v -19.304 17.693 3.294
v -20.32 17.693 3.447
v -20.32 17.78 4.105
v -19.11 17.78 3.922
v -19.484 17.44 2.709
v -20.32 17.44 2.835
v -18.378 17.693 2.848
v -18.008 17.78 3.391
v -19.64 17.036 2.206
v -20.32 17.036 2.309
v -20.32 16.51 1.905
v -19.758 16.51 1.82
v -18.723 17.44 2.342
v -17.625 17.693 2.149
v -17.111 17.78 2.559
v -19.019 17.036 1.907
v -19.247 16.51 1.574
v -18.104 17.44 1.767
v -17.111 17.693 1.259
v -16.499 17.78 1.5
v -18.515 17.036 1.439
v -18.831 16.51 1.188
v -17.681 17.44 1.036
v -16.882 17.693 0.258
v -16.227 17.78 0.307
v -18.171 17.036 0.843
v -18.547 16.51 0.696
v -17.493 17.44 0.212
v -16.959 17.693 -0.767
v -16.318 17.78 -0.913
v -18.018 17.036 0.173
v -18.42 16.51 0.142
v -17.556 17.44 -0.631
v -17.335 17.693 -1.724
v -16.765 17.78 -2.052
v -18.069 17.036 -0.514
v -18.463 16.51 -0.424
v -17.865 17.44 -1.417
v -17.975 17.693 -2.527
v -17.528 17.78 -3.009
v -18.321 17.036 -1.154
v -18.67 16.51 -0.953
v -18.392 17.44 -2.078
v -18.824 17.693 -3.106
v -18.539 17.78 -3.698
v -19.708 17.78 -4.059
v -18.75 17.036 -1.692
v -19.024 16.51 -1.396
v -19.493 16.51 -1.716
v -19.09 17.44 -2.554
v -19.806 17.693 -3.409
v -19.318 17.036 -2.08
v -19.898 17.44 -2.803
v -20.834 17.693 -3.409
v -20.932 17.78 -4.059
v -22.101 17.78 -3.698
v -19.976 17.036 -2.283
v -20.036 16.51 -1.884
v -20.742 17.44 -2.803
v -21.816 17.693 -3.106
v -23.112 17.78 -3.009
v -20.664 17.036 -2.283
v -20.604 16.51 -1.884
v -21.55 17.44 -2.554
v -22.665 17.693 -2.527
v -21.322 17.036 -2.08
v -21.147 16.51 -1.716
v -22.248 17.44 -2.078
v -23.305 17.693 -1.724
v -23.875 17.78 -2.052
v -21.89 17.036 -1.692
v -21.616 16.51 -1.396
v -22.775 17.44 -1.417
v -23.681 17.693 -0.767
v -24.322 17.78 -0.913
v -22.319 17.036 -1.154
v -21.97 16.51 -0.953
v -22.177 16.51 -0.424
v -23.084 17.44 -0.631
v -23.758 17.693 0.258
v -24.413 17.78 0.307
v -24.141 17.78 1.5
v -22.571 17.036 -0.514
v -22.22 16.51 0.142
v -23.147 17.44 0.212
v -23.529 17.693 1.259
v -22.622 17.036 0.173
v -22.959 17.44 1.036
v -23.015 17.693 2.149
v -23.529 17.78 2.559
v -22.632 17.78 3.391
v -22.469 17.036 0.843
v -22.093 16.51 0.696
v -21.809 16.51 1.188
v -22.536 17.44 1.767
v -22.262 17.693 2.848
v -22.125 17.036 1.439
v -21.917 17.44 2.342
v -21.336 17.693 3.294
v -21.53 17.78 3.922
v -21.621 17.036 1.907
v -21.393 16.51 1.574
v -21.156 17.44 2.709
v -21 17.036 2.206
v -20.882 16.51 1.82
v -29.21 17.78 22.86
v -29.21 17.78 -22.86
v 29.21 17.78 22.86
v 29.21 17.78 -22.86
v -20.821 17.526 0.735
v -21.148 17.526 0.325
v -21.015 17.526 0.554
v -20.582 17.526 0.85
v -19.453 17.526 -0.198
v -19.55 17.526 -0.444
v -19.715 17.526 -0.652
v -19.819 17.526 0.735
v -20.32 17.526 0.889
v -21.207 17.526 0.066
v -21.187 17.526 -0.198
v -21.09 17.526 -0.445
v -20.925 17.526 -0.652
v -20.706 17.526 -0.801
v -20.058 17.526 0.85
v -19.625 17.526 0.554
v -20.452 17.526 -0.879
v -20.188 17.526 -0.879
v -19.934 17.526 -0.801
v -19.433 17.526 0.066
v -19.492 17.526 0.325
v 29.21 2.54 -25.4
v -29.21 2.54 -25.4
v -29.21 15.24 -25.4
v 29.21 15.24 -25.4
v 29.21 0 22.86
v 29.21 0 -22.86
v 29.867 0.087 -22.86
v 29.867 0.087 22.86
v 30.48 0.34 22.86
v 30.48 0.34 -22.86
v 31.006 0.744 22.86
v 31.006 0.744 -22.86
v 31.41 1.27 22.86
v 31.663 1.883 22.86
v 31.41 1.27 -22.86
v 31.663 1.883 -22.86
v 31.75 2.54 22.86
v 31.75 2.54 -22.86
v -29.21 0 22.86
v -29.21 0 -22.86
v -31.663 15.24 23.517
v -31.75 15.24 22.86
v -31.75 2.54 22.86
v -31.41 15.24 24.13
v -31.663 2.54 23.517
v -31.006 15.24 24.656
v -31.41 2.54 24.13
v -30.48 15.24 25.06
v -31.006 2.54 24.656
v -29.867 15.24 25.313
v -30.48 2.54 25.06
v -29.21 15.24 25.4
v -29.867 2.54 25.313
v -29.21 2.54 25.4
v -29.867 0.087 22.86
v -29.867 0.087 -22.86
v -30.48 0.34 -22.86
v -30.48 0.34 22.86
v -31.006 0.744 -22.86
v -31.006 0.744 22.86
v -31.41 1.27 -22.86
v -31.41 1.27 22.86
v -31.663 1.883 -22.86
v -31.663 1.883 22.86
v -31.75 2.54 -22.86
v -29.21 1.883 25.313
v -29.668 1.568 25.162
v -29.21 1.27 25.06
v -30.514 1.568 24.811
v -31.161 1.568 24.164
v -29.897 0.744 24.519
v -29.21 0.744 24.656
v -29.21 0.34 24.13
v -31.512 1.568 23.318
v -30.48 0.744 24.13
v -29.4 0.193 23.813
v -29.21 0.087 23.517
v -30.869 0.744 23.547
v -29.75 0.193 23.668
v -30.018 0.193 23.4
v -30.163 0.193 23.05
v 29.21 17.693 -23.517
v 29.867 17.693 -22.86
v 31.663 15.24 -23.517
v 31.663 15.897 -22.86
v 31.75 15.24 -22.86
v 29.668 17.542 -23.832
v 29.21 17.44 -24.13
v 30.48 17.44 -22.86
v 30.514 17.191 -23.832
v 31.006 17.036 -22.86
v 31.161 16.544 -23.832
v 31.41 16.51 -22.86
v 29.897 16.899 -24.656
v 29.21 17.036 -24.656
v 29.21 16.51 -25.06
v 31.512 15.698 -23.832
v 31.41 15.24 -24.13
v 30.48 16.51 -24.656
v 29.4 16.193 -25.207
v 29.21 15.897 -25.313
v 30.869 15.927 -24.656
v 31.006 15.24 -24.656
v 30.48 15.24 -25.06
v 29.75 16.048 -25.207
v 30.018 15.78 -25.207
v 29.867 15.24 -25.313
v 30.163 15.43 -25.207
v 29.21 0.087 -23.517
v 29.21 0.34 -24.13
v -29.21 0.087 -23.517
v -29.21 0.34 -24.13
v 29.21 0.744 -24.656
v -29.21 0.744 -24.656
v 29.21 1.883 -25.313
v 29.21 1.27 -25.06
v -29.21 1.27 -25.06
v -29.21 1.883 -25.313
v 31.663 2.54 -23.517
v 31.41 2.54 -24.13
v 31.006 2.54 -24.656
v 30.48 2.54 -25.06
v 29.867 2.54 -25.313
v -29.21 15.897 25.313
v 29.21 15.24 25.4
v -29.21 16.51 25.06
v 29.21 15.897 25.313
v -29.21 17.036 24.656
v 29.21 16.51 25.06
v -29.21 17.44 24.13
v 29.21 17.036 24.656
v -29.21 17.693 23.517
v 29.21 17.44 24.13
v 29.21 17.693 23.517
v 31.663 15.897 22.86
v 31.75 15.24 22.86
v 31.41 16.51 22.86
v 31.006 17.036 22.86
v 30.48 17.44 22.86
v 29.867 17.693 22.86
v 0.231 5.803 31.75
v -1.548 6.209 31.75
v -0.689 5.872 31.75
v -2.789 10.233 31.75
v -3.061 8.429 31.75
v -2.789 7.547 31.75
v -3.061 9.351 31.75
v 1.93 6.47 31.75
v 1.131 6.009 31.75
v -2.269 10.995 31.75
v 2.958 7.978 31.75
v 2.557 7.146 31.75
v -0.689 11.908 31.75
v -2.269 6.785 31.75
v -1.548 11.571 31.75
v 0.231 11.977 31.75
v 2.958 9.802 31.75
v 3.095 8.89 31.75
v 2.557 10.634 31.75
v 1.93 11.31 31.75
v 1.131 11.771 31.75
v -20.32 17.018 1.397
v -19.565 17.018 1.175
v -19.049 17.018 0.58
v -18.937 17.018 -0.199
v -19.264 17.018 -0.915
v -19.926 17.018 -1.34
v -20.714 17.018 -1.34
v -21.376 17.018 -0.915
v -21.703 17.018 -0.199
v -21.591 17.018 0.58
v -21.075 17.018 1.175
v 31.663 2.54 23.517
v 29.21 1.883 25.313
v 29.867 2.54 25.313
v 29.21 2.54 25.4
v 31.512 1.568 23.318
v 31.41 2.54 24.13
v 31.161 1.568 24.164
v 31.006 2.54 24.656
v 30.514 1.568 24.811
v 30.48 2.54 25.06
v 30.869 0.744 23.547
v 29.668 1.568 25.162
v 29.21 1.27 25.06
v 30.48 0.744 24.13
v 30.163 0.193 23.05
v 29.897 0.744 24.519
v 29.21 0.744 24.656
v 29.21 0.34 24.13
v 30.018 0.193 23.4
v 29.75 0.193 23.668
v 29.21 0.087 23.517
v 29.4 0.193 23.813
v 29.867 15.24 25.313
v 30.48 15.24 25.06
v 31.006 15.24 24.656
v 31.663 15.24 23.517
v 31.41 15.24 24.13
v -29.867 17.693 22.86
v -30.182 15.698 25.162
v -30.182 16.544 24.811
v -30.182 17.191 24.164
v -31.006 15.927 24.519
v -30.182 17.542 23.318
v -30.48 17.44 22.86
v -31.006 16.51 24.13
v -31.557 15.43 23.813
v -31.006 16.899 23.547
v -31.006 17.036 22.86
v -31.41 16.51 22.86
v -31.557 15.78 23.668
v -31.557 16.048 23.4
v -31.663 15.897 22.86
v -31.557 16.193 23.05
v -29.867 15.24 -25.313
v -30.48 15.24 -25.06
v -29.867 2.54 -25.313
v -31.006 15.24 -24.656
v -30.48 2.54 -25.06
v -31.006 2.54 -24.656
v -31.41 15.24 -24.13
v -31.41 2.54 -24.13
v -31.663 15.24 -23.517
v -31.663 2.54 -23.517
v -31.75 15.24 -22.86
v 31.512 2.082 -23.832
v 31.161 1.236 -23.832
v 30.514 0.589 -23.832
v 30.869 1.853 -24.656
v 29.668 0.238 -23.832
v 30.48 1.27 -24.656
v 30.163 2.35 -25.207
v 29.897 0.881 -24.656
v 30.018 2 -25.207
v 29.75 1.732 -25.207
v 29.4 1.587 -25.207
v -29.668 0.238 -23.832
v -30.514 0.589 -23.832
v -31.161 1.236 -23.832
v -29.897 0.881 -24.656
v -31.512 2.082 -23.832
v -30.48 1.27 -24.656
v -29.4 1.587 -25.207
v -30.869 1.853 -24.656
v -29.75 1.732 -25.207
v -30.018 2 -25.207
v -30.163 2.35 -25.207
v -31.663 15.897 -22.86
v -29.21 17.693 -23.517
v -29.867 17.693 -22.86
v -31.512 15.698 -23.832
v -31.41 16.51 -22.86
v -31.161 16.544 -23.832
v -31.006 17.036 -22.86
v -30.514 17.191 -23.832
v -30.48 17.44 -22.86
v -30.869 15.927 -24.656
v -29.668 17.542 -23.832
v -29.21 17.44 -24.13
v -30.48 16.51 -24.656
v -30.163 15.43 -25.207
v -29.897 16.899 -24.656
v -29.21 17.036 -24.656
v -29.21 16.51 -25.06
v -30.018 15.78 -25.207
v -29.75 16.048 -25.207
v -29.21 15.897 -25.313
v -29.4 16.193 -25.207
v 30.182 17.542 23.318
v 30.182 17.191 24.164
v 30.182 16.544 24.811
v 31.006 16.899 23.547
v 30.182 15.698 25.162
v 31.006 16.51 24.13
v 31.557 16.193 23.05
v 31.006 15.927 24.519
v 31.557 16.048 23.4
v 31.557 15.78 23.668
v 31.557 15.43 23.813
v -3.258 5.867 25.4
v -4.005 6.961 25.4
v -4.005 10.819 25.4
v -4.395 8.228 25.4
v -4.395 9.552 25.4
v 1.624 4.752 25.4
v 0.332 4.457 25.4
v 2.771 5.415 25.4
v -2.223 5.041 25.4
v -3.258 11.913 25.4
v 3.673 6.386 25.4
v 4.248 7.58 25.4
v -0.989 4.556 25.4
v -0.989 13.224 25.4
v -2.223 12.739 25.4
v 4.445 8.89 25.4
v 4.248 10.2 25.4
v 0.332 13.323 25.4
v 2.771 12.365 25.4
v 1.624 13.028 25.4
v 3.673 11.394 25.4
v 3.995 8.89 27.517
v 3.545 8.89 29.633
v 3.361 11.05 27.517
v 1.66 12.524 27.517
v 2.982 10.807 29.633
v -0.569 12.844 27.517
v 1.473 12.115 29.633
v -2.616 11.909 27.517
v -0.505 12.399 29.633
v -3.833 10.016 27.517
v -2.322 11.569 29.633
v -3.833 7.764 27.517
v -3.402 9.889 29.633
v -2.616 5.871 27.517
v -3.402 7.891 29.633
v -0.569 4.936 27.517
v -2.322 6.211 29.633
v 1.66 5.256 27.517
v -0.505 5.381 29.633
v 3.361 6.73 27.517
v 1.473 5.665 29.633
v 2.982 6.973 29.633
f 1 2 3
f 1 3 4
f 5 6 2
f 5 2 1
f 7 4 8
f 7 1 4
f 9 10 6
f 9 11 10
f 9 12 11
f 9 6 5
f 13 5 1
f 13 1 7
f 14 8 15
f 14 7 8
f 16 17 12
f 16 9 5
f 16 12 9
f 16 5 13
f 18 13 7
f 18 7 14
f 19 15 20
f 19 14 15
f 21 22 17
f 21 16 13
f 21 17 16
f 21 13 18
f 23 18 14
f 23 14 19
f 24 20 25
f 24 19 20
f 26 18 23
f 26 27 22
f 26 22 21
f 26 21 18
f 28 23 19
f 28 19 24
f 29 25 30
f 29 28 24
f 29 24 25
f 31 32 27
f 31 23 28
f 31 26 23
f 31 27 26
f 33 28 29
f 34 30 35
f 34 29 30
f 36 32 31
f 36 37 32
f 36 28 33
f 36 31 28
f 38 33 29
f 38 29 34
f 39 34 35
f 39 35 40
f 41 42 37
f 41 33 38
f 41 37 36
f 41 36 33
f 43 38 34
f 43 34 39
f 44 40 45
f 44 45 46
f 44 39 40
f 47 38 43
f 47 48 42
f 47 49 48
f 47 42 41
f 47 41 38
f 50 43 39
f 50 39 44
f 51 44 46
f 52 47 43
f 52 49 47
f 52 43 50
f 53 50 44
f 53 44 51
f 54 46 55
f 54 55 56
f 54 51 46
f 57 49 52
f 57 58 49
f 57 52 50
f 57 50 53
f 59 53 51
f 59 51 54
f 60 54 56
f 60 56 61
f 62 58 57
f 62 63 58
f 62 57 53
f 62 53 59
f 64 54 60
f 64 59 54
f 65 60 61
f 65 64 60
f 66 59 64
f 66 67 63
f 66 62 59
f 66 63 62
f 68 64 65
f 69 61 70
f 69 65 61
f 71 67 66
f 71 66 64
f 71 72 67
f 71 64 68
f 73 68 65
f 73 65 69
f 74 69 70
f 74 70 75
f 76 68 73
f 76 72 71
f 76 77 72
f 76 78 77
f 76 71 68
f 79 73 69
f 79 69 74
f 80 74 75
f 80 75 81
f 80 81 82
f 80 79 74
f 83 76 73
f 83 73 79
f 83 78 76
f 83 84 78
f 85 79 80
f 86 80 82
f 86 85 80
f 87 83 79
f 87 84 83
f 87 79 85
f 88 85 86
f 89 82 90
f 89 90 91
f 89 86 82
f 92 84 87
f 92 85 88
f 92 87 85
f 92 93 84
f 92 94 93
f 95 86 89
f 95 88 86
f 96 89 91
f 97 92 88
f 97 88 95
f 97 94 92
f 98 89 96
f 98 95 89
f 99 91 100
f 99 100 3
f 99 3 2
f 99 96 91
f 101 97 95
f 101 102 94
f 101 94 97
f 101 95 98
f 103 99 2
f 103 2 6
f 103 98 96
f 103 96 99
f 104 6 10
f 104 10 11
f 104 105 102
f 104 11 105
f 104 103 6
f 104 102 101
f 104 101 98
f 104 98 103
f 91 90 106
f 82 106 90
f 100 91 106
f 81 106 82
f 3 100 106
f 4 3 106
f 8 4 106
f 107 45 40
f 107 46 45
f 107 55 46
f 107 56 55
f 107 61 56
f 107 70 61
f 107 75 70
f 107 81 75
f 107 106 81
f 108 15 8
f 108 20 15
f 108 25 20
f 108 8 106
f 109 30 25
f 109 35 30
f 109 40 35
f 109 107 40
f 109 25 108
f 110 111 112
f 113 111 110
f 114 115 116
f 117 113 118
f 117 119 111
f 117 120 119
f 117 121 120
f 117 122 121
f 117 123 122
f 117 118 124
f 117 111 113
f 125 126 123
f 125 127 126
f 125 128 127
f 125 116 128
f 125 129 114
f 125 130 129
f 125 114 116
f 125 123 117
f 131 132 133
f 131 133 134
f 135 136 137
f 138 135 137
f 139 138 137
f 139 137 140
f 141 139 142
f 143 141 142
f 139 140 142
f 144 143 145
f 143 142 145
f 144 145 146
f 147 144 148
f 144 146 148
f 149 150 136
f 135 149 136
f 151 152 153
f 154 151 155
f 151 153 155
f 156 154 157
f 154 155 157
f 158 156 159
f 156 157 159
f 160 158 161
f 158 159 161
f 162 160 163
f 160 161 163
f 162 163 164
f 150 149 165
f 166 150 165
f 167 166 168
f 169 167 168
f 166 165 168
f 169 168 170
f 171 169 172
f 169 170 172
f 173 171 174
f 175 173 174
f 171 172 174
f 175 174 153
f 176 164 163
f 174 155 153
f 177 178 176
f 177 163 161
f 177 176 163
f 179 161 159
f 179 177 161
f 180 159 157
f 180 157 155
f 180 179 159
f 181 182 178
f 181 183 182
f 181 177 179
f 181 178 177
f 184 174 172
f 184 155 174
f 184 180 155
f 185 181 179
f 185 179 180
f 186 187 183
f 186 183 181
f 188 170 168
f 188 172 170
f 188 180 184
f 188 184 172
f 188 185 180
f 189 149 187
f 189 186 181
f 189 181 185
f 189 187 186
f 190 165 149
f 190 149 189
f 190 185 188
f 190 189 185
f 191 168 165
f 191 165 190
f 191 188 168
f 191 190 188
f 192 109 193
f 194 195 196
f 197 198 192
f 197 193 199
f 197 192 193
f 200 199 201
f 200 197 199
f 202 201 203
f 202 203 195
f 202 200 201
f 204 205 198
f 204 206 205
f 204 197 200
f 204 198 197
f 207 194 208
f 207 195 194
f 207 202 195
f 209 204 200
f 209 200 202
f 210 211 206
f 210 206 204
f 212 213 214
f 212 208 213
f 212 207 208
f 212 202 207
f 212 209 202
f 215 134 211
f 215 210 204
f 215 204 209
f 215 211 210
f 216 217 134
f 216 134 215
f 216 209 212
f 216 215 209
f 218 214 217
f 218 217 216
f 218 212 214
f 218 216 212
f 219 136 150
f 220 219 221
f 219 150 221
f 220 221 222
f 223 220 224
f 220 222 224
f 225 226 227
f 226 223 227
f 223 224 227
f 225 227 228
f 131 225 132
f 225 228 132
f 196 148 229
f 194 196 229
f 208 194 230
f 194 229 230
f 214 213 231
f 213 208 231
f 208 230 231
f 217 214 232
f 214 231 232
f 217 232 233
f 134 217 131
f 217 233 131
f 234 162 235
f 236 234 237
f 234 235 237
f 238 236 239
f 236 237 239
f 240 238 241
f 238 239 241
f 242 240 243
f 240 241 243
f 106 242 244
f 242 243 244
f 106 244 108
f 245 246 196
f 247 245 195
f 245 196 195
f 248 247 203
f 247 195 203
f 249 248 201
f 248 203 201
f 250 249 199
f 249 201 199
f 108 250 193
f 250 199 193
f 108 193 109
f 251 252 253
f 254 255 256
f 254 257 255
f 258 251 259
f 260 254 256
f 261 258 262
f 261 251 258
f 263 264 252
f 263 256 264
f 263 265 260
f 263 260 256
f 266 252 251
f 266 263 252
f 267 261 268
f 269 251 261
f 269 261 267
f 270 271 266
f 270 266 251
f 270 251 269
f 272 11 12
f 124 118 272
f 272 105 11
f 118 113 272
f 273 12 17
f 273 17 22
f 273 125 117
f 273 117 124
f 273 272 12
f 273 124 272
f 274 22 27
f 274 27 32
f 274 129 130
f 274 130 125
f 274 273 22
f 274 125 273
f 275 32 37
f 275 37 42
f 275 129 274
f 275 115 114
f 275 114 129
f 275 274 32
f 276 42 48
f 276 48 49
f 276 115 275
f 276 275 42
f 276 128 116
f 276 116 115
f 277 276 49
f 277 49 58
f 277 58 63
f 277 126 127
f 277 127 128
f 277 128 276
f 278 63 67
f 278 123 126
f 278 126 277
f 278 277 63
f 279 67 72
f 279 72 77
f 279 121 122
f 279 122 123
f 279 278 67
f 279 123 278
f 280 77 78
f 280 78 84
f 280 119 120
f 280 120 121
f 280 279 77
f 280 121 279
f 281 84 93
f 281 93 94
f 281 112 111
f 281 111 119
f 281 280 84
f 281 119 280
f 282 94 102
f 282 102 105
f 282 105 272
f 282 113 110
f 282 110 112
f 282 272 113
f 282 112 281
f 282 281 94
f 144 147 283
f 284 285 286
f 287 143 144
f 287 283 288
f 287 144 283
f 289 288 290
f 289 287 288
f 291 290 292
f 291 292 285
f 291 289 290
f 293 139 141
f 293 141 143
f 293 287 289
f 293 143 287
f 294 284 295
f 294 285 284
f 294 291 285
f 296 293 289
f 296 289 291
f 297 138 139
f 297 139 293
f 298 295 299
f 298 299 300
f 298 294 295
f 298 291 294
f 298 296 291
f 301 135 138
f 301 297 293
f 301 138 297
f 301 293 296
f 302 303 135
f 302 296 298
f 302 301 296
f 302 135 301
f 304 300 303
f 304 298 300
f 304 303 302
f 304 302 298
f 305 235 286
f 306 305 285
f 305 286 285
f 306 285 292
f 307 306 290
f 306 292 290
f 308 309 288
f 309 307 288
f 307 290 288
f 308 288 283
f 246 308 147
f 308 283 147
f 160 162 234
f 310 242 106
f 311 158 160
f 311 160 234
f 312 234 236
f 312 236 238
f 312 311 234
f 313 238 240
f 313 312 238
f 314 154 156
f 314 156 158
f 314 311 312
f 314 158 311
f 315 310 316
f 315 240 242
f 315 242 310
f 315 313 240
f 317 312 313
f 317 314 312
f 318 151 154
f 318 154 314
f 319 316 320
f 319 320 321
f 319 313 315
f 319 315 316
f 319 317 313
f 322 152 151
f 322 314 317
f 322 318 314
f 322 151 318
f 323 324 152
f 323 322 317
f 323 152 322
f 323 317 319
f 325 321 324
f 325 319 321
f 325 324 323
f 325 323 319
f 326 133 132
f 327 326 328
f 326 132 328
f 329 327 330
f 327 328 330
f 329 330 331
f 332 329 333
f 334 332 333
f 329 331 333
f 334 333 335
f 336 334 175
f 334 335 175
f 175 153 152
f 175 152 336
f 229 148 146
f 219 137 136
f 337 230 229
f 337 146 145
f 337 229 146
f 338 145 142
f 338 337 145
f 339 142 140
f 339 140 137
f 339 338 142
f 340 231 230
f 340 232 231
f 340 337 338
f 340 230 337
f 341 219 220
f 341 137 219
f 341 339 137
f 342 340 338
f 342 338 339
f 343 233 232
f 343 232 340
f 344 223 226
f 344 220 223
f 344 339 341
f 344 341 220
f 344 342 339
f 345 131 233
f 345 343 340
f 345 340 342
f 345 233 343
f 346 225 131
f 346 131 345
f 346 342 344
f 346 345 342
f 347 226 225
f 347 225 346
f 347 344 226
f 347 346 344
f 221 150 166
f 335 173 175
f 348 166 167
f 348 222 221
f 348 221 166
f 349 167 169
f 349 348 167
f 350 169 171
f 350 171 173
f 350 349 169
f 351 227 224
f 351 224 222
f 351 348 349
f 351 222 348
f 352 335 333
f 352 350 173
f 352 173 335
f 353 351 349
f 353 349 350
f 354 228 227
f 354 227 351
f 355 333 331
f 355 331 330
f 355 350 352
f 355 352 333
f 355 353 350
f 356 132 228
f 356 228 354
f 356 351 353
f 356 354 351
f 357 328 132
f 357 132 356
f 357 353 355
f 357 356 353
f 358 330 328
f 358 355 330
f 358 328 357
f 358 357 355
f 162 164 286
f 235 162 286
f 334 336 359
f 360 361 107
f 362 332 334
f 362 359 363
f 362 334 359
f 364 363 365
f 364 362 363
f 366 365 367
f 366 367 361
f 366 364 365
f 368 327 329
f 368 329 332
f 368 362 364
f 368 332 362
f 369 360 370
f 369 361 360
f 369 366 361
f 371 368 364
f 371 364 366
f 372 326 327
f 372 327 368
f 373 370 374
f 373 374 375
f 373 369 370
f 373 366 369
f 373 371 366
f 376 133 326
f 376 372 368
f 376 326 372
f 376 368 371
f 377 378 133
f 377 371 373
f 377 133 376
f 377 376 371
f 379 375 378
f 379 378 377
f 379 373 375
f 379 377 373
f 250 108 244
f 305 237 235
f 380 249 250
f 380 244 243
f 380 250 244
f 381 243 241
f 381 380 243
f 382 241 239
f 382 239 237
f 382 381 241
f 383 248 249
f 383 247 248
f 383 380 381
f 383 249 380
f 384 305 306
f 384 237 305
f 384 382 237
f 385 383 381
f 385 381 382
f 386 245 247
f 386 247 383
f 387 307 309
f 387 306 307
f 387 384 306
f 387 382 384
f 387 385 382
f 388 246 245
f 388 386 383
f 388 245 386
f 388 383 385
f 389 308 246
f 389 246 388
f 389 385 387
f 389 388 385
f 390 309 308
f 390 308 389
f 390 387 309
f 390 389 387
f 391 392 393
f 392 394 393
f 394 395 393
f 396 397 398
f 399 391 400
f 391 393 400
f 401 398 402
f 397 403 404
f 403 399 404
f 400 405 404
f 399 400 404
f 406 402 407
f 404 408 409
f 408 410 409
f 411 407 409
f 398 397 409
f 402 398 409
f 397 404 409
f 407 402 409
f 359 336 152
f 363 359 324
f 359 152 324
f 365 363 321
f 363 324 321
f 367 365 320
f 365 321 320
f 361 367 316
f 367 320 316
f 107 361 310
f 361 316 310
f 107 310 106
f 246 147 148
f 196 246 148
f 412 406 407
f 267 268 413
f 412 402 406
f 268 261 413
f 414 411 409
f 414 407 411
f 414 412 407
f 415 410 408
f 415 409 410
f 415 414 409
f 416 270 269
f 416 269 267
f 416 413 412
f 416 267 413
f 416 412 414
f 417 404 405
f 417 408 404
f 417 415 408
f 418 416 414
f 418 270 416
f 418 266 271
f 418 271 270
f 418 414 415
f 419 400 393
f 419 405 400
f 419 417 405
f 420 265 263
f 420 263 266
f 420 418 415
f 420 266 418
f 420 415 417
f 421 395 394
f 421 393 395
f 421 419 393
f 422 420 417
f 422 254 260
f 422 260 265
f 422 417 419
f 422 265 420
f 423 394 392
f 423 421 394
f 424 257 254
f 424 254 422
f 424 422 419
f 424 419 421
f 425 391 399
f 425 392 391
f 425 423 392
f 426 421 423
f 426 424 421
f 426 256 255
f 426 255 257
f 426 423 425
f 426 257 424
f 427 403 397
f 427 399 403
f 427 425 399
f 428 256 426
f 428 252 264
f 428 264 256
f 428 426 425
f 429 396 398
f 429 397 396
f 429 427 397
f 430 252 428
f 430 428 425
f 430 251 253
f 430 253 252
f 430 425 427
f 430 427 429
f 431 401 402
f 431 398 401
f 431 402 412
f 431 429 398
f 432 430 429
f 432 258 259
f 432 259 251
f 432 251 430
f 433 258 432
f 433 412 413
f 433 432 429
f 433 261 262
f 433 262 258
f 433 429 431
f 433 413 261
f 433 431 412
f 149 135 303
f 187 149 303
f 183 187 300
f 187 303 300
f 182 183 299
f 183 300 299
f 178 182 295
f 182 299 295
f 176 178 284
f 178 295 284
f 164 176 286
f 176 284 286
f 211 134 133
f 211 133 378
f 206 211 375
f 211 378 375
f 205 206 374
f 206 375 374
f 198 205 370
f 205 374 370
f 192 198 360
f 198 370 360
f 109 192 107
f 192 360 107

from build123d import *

# Parameters (mm, degrees)
SKETCH1_W           = 63.5
SKETCH1_H           = 50.8
BOSS_EXTRUDE1_DEPTH = 17.78
SKETCH2_R           = 4.445
BOSS_EXTRUDE2_DEPTH = 6.35
BOSS_EXTRUDE2_TAPER = 12
SKETCH3_R           = 1.905
CUT_EXTRUDE1_DEPTH  = 1.27
SKETCH4_R           = 1.905
BOSS_EXTRUDE3_DEPTH = 1.016
BOSS_EXTRUDE3_TAPER = 45
FILLET1_R           = 2.54
FILLET2_R           = 2.54


with BuildPart() as part:
    # Sketch1 → Boss-Extrude1 (new body)
    with BuildSketch(Plane(origin=(0, 0, 0), x_dir=(1, 0, 0), z_dir=(0, 1, 0))):
        Rectangle(SKETCH1_W, SKETCH1_H)
    extrude(amount=BOSS_EXTRUDE1_DEPTH)

    # Sketch3 → Cut-Extrude1 (cut)
    with BuildSketch(Plane(origin=(0, 17.78, 0), x_dir=(1, 0, 0), z_dir=(0, 1, 0))):
        with Locations(Location((-20.32, 0, 0), (0, 0, 270))):
            Circle(SKETCH3_R)
    extrude(amount=-CUT_EXTRUDE1_DEPTH, mode=Mode.SUBTRACT)

    # Sketch4 → Boss-Extrude3 (add)
    with BuildSketch(Plane(origin=(0, 16.51, 0), x_dir=(1, 0, 0), z_dir=(0, 1, 0))):
        with Locations(Location((-20.32, 0, 0), (0, 0, 270))):
            Circle(SKETCH4_R)
    extrude(amount=BOSS_EXTRUDE3_DEPTH, taper=BOSS_EXTRUDE3_TAPER)

    # Fillet1
    # the kernel refuses this fillet: 2.54 mm, written as the material it takes off along each edge
    with BuildSketch(Plane(origin=(-31.75, 17.78, 31.75), x_dir=(0, -1, 0), z_dir=(0, 0, -1)), Plane(origin=(31.75, 17.78, -31.75), x_dir=(0, -1, 0), z_dir=(0, 0, 1))) as fillet1_piece_1:
        with BuildLine():
            CenterArc((FILLET1_R, -FILLET1_R), FILLET1_R, 90, 90)
            Line((0, -FILLET1_R), (0, 0))
            Line((0, 0), (FILLET1_R, 0))
        make_face()
    extrude(amount=63.5, mode=Mode.SUBTRACT)
    with BuildSketch(Plane(origin=(38.1, 17.78, 25.4), x_dir=(0, 0, -1), z_dir=(-1, 0, 0))) as fillet1_piece_2:
        with BuildLine():
            CenterArc((FILLET1_R, FILLET1_R), FILLET1_R, 180, 90)
            Line((0, FILLET1_R), (0, 0))
            Line((0, 0), (FILLET1_R, 0))
        make_face()
    extrude(amount=76.2, mode=Mode.SUBTRACT)
    with BuildSketch(Plane(origin=(-20.32, 17.78, 0), x_dir=(0, 0, 1), z_dir=(-1, 0, 0))) as fillet1_piece_3:
        with BuildLine():
            CenterArc((4.104704526, -2.54), FILLET1_R, 90, 60)
            Line((1.905, -1.27), (1.905, 0))
            Line((1.905, 0), (4.104704526, 0))
        make_face()
    revolve(axis=Axis((-20.32, 17.78, 0), (0, 1, 0)), mode=Mode.SUBTRACT)
    with BuildSketch(Plane(origin=(-38.1, 17.78, -25.4), x_dir=(0, -1, 0), z_dir=(1, 0, 0))) as fillet1_piece_4:
        with BuildLine():
            CenterArc((FILLET1_R, -FILLET1_R), FILLET1_R, 90, 90)
            Line((0, -FILLET1_R), (0, 0))
            Line((0, 0), (FILLET1_R, 0))
        make_face()
    extrude(amount=76.2, mode=Mode.SUBTRACT)

    # Fillet2
    # the kernel refuses this fillet: 2.54 mm, written as the material it takes off along each edge
    with BuildSketch(Plane(origin=(-29.21, 15.24, -22.86), x_dir=(-1, 0, 0), z_dir=(0, 0, -1))) as fillet2_piece_1_section:
        Polygon((0, 0), (FILLET2_R, 0), (FILLET2_R, FILLET2_R), (0, FILLET2_R), align=None)
    fillet2_piece_1 = extrude(amount=FILLET2_R, mode=Mode.PRIVATE)
    fillet2_piece_1 = fillet2_piece_1 - Plane(origin=(-29.21, 15.24, -22.86), x_dir=(0.7071067811865475, -0.7071067811865475, 0), z_dir=(0, 0, -1)) * Sphere(FILLET2_R, mode=Mode.PRIVATE)
    add(fillet2_piece_1, mode=Mode.SUBTRACT)
    with BuildSketch(Plane(origin=(29.21, 15.24, -22.86), x_dir=(1, 0, 0), z_dir=(0, 0, -1))) as fillet2_piece_2_section:
        Polygon((0, 0), (FILLET2_R, 0), (FILLET2_R, -FILLET2_R), (0, -FILLET2_R), align=None)
    fillet2_piece_2 = extrude(amount=FILLET2_R, mode=Mode.PRIVATE)
    fillet2_piece_2 = fillet2_piece_2 - Plane(origin=(29.21, 15.24, -22.86), x_dir=(-0.7071067811865475, -0.7071067811865475, 0), z_dir=(0, 0, -1)) * Sphere(FILLET2_R, mode=Mode.PRIVATE)
    add(fillet2_piece_2, mode=Mode.SUBTRACT)
    with BuildSketch(Plane(origin=(-29.21, 15.24, 22.86), x_dir=(0, 0, 1), z_dir=(-1, 0, 0))) as fillet2_piece_3_section:
        Polygon((0, 0), (FILLET2_R, 0), (FILLET2_R, FILLET2_R), (0, FILLET2_R), align=None)
    fillet2_piece_3 = extrude(amount=FILLET2_R, mode=Mode.PRIVATE)
    fillet2_piece_3 = fillet2_piece_3 - Plane(origin=(-29.21, 15.24, 22.86), x_dir=(0, -0.7071067811865475, -0.7071067811865475), z_dir=(-1, 0, 0)) * Sphere(FILLET2_R, mode=Mode.PRIVATE)
    add(fillet2_piece_3, mode=Mode.SUBTRACT)
    with BuildSketch(Plane(origin=(29.21, 15.24, 22.86), x_dir=(0, 0, 1), z_dir=(1, 0, 0))) as fillet2_piece_4_section:
        Polygon((0, 0), (FILLET2_R, 0), (FILLET2_R, -FILLET2_R), (0, -FILLET2_R), align=None)
    fillet2_piece_4 = extrude(amount=FILLET2_R, mode=Mode.PRIVATE)
    fillet2_piece_4 = fillet2_piece_4 - Plane(origin=(29.21, 15.24, 22.86), x_dir=(0, -0.7071067811865475, -0.7071067811865475), z_dir=(1, 0, 0)) * Sphere(FILLET2_R, mode=Mode.PRIVATE)
    add(fillet2_piece_4, mode=Mode.SUBTRACT)
    with BuildSketch(Plane(origin=(29.21, 2.54, 22.86), x_dir=(1, 0, 0), z_dir=(0, -1, 0))) as fillet2_piece_5_section:
        Polygon((0, 0), (FILLET2_R, 0), (FILLET2_R, FILLET2_R), (0, FILLET2_R), align=None)
    fillet2_piece_5 = extrude(amount=FILLET2_R, mode=Mode.PRIVATE)
    fillet2_piece_5 = fillet2_piece_5 - Plane(origin=(29.21, 2.54, 22.86), x_dir=(-0.7071067811865475, 0, -0.7071067811865475), z_dir=(0, -1, 0)) * Sphere(FILLET2_R, mode=Mode.PRIVATE)
    add(fillet2_piece_5, mode=Mode.SUBTRACT)
    with BuildSketch(Plane(origin=(-29.21, 2.54, 22.86), x_dir=(-1, 0, 0), z_dir=(0, -1, 0))) as fillet2_piece_6_section:
        Polygon((0, 0), (FILLET2_R, 0), (FILLET2_R, -FILLET2_R), (0, -FILLET2_R), align=None)
    fillet2_piece_6 = extrude(amount=FILLET2_R, mode=Mode.PRIVATE)
    fillet2_piece_6 = fillet2_piece_6 - Plane(origin=(-29.21, 2.54, 22.86), x_dir=(0.7071067811865475, 0, -0.7071067811865477), z_dir=(0, -1, 0)) * Sphere(FILLET2_R, mode=Mode.PRIVATE)
    add(fillet2_piece_6, mode=Mode.SUBTRACT)
    with BuildSketch(Plane(origin=(-29.21, 2.54, -22.86), x_dir=(0, -1, 0), z_dir=(0, 0, -1))) as fillet2_piece_7_section:
        Polygon((0, 0), (FILLET2_R, 0), (FILLET2_R, FILLET2_R), (0, FILLET2_R), align=None)
    fillet2_piece_7 = extrude(amount=FILLET2_R, mode=Mode.PRIVATE)
    fillet2_piece_7 = fillet2_piece_7 - Plane(origin=(-29.21, 2.54, -22.86), x_dir=(0.7071067811865475, 0.7071067811865475, 0), z_dir=(0, 0, -1)) * Sphere(FILLET2_R, mode=Mode.PRIVATE)
    add(fillet2_piece_7, mode=Mode.SUBTRACT)
    with BuildSketch(Plane(origin=(29.21, 2.54, -22.86), x_dir=(0, -1, 0), z_dir=(0, 0, -1))) as fillet2_piece_8_section:
        Polygon((0, 0), (FILLET2_R, 0), (FILLET2_R, -FILLET2_R), (0, -FILLET2_R), align=None)
    fillet2_piece_8 = extrude(amount=FILLET2_R, mode=Mode.PRIVATE)
    fillet2_piece_8 = fillet2_piece_8 - Plane(origin=(29.21, 2.54, -22.86), x_dir=(-0.7071067811865475, 0.7071067811865475, 0), z_dir=(0, 0, -1)) * Sphere(FILLET2_R, mode=Mode.PRIVATE)
    add(fillet2_piece_8, mode=Mode.SUBTRACT)
    with BuildSketch(Plane(origin=(31.75, 2.54, 25.4), x_dir=(0, 0, -1), z_dir=(0, 1, 0)), Plane(origin=(31.75, 2.54, -25.4), x_dir=(-1, 0, 0), z_dir=(0, 1, 0))) as fillet2_piece_9:
        with BuildLine():
            CenterArc((FILLET2_R, FILLET2_R), FILLET2_R, 180, 90)
            Line((0, FILLET2_R), (0, 0))
            Line((0, 0), (FILLET2_R, 0))
        make_face()
    extrude(amount=12.7, mode=Mode.SUBTRACT)
    with BuildSketch(Plane(origin=(-31.75, 2.54, 25.4), x_dir=(0, 0, -1), z_dir=(0, 1, 0)), Plane(origin=(-31.75, 2.54, -25.4), x_dir=(1, 0, 0), z_dir=(0, 1, 0))) as fillet2_piece_10:
        with BuildLine():
            CenterArc((FILLET2_R, -FILLET2_R), FILLET2_R, 90, 90)
            Line((0, -FILLET2_R), (0, 0))
            Line((0, 0), (FILLET2_R, 0))
        make_face()
    extrude(amount=12.7, mode=Mode.SUBTRACT)
    with BuildSketch(Plane(origin=(29.21, 0, 25.4), x_dir=(0, 0, -1), z_dir=(-1, 0, 0))) as fillet2_piece_11:
        with BuildLine():
            CenterArc((FILLET2_R, -FILLET2_R), FILLET2_R, 90, 90)
            Line((0, -FILLET2_R), (0, 0))
            Line((0, 0), (FILLET2_R, 0))
        make_face()
    extrude(amount=58.42, mode=Mode.SUBTRACT)
    with BuildSketch(Plane(origin=(-31.75, 0, 22.86), x_dir=(1, 0, 0), z_dir=(0, 0, -1)), Plane(origin=(31.75, 0, -22.86), x_dir=(-1, 0, 0), z_dir=(0, 0, 1))) as fillet2_piece_12:
        with BuildLine():
            CenterArc((FILLET2_R, -FILLET2_R), FILLET2_R, 90, 90)
            Line((0, -FILLET2_R), (0, 0))
            Line((0, 0), (FILLET2_R, 0))
        make_face()
    extrude(amount=45.72, mode=Mode.SUBTRACT)
    with BuildSketch(Plane(origin=(-29.21, 0, -25.4), x_dir=(0, 1, 0), z_dir=(1, 0, 0))) as fillet2_piece_13:
        with BuildLine():
            CenterArc((FILLET2_R, FILLET2_R), FILLET2_R, 180, 90)
            Line((0, FILLET2_R), (0, 0))
            Line((0, 0), (FILLET2_R, 0))
        make_face()
    extrude(amount=58.42, mode=Mode.SUBTRACT)


with BuildPart() as body_2:
    # Sketch2 → Boss-Extrude2 (new body)
    with BuildSketch(Plane.XY.offset(25.4)):
        with Locations((0, 8.89)):
            Circle(SKETCH2_R)
    extrude(amount=BOSS_EXTRUDE2_DEPTH, taper=BOSS_EXTRUDE2_TAPER)


solid = Compound([part.part, body_2.part])
